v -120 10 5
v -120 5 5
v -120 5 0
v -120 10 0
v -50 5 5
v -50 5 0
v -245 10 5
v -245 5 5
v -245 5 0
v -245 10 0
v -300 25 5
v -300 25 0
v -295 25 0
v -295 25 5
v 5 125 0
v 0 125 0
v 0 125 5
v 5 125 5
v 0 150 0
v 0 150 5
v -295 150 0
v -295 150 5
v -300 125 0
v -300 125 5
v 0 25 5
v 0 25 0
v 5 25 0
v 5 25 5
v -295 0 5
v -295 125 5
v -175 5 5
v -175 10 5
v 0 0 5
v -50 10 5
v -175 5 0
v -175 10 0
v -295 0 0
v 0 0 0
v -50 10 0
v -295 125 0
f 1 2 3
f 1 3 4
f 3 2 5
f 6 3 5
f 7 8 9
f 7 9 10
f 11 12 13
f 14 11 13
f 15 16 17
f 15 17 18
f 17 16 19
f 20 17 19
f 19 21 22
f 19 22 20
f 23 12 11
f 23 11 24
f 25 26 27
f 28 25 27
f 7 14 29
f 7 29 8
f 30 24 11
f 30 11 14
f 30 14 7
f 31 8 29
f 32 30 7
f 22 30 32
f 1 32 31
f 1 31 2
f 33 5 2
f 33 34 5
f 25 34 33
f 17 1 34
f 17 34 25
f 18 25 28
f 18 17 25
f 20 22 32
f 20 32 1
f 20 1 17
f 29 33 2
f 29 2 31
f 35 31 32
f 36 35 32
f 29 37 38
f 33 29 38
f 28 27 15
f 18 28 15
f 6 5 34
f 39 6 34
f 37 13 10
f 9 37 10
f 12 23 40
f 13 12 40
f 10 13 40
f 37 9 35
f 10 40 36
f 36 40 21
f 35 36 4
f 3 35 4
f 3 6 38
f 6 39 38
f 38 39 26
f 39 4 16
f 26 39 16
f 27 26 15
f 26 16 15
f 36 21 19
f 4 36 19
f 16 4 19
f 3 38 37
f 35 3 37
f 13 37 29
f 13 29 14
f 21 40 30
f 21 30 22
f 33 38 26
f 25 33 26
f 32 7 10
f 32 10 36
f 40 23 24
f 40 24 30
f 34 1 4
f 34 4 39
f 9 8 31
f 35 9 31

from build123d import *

# Parameters (mm, degrees)
SKETCH1_W           = 5
SKETCH1_H           = 100
SKETCH1_W_2         = 295
SKETCH1_H_2         = 150
BOSS_EXTRUDE1_DEPTH = 5
SKETCH2_W           = 70
SKETCH2_H           = 5
CUT_EXTRUDE1_DEPTH  = 5


with BuildPart() as part:
    # Sketch1 → Boss-Extrude1 (new body)
    with BuildSketch(Plane.XY):
        with Locations((-297.5, 75)):
            Rectangle(SKETCH1_W, SKETCH1_H)
        with Locations((-147.5, 75)):
            Rectangle(SKETCH1_W_2, SKETCH1_H_2)
        with Locations((2.5, 75)):
            Rectangle(SKETCH1_W, SKETCH1_H)
    extrude(amount=BOSS_EXTRUDE1_DEPTH)

    # Sketch2 → Cut-Extrude1 (cut)
    with BuildSketch(Plane.XY.offset(5)):
        with Locations((-210, 7.5)):
            Rectangle(SKETCH2_W, SKETCH2_H)
        with Locations((-85, 7.5)):
            Rectangle(SKETCH2_W, SKETCH2_H)
    extrude(amount=-CUT_EXTRUDE1_DEPTH, mode=Mode.SUBTRACT)


solid = part.part
